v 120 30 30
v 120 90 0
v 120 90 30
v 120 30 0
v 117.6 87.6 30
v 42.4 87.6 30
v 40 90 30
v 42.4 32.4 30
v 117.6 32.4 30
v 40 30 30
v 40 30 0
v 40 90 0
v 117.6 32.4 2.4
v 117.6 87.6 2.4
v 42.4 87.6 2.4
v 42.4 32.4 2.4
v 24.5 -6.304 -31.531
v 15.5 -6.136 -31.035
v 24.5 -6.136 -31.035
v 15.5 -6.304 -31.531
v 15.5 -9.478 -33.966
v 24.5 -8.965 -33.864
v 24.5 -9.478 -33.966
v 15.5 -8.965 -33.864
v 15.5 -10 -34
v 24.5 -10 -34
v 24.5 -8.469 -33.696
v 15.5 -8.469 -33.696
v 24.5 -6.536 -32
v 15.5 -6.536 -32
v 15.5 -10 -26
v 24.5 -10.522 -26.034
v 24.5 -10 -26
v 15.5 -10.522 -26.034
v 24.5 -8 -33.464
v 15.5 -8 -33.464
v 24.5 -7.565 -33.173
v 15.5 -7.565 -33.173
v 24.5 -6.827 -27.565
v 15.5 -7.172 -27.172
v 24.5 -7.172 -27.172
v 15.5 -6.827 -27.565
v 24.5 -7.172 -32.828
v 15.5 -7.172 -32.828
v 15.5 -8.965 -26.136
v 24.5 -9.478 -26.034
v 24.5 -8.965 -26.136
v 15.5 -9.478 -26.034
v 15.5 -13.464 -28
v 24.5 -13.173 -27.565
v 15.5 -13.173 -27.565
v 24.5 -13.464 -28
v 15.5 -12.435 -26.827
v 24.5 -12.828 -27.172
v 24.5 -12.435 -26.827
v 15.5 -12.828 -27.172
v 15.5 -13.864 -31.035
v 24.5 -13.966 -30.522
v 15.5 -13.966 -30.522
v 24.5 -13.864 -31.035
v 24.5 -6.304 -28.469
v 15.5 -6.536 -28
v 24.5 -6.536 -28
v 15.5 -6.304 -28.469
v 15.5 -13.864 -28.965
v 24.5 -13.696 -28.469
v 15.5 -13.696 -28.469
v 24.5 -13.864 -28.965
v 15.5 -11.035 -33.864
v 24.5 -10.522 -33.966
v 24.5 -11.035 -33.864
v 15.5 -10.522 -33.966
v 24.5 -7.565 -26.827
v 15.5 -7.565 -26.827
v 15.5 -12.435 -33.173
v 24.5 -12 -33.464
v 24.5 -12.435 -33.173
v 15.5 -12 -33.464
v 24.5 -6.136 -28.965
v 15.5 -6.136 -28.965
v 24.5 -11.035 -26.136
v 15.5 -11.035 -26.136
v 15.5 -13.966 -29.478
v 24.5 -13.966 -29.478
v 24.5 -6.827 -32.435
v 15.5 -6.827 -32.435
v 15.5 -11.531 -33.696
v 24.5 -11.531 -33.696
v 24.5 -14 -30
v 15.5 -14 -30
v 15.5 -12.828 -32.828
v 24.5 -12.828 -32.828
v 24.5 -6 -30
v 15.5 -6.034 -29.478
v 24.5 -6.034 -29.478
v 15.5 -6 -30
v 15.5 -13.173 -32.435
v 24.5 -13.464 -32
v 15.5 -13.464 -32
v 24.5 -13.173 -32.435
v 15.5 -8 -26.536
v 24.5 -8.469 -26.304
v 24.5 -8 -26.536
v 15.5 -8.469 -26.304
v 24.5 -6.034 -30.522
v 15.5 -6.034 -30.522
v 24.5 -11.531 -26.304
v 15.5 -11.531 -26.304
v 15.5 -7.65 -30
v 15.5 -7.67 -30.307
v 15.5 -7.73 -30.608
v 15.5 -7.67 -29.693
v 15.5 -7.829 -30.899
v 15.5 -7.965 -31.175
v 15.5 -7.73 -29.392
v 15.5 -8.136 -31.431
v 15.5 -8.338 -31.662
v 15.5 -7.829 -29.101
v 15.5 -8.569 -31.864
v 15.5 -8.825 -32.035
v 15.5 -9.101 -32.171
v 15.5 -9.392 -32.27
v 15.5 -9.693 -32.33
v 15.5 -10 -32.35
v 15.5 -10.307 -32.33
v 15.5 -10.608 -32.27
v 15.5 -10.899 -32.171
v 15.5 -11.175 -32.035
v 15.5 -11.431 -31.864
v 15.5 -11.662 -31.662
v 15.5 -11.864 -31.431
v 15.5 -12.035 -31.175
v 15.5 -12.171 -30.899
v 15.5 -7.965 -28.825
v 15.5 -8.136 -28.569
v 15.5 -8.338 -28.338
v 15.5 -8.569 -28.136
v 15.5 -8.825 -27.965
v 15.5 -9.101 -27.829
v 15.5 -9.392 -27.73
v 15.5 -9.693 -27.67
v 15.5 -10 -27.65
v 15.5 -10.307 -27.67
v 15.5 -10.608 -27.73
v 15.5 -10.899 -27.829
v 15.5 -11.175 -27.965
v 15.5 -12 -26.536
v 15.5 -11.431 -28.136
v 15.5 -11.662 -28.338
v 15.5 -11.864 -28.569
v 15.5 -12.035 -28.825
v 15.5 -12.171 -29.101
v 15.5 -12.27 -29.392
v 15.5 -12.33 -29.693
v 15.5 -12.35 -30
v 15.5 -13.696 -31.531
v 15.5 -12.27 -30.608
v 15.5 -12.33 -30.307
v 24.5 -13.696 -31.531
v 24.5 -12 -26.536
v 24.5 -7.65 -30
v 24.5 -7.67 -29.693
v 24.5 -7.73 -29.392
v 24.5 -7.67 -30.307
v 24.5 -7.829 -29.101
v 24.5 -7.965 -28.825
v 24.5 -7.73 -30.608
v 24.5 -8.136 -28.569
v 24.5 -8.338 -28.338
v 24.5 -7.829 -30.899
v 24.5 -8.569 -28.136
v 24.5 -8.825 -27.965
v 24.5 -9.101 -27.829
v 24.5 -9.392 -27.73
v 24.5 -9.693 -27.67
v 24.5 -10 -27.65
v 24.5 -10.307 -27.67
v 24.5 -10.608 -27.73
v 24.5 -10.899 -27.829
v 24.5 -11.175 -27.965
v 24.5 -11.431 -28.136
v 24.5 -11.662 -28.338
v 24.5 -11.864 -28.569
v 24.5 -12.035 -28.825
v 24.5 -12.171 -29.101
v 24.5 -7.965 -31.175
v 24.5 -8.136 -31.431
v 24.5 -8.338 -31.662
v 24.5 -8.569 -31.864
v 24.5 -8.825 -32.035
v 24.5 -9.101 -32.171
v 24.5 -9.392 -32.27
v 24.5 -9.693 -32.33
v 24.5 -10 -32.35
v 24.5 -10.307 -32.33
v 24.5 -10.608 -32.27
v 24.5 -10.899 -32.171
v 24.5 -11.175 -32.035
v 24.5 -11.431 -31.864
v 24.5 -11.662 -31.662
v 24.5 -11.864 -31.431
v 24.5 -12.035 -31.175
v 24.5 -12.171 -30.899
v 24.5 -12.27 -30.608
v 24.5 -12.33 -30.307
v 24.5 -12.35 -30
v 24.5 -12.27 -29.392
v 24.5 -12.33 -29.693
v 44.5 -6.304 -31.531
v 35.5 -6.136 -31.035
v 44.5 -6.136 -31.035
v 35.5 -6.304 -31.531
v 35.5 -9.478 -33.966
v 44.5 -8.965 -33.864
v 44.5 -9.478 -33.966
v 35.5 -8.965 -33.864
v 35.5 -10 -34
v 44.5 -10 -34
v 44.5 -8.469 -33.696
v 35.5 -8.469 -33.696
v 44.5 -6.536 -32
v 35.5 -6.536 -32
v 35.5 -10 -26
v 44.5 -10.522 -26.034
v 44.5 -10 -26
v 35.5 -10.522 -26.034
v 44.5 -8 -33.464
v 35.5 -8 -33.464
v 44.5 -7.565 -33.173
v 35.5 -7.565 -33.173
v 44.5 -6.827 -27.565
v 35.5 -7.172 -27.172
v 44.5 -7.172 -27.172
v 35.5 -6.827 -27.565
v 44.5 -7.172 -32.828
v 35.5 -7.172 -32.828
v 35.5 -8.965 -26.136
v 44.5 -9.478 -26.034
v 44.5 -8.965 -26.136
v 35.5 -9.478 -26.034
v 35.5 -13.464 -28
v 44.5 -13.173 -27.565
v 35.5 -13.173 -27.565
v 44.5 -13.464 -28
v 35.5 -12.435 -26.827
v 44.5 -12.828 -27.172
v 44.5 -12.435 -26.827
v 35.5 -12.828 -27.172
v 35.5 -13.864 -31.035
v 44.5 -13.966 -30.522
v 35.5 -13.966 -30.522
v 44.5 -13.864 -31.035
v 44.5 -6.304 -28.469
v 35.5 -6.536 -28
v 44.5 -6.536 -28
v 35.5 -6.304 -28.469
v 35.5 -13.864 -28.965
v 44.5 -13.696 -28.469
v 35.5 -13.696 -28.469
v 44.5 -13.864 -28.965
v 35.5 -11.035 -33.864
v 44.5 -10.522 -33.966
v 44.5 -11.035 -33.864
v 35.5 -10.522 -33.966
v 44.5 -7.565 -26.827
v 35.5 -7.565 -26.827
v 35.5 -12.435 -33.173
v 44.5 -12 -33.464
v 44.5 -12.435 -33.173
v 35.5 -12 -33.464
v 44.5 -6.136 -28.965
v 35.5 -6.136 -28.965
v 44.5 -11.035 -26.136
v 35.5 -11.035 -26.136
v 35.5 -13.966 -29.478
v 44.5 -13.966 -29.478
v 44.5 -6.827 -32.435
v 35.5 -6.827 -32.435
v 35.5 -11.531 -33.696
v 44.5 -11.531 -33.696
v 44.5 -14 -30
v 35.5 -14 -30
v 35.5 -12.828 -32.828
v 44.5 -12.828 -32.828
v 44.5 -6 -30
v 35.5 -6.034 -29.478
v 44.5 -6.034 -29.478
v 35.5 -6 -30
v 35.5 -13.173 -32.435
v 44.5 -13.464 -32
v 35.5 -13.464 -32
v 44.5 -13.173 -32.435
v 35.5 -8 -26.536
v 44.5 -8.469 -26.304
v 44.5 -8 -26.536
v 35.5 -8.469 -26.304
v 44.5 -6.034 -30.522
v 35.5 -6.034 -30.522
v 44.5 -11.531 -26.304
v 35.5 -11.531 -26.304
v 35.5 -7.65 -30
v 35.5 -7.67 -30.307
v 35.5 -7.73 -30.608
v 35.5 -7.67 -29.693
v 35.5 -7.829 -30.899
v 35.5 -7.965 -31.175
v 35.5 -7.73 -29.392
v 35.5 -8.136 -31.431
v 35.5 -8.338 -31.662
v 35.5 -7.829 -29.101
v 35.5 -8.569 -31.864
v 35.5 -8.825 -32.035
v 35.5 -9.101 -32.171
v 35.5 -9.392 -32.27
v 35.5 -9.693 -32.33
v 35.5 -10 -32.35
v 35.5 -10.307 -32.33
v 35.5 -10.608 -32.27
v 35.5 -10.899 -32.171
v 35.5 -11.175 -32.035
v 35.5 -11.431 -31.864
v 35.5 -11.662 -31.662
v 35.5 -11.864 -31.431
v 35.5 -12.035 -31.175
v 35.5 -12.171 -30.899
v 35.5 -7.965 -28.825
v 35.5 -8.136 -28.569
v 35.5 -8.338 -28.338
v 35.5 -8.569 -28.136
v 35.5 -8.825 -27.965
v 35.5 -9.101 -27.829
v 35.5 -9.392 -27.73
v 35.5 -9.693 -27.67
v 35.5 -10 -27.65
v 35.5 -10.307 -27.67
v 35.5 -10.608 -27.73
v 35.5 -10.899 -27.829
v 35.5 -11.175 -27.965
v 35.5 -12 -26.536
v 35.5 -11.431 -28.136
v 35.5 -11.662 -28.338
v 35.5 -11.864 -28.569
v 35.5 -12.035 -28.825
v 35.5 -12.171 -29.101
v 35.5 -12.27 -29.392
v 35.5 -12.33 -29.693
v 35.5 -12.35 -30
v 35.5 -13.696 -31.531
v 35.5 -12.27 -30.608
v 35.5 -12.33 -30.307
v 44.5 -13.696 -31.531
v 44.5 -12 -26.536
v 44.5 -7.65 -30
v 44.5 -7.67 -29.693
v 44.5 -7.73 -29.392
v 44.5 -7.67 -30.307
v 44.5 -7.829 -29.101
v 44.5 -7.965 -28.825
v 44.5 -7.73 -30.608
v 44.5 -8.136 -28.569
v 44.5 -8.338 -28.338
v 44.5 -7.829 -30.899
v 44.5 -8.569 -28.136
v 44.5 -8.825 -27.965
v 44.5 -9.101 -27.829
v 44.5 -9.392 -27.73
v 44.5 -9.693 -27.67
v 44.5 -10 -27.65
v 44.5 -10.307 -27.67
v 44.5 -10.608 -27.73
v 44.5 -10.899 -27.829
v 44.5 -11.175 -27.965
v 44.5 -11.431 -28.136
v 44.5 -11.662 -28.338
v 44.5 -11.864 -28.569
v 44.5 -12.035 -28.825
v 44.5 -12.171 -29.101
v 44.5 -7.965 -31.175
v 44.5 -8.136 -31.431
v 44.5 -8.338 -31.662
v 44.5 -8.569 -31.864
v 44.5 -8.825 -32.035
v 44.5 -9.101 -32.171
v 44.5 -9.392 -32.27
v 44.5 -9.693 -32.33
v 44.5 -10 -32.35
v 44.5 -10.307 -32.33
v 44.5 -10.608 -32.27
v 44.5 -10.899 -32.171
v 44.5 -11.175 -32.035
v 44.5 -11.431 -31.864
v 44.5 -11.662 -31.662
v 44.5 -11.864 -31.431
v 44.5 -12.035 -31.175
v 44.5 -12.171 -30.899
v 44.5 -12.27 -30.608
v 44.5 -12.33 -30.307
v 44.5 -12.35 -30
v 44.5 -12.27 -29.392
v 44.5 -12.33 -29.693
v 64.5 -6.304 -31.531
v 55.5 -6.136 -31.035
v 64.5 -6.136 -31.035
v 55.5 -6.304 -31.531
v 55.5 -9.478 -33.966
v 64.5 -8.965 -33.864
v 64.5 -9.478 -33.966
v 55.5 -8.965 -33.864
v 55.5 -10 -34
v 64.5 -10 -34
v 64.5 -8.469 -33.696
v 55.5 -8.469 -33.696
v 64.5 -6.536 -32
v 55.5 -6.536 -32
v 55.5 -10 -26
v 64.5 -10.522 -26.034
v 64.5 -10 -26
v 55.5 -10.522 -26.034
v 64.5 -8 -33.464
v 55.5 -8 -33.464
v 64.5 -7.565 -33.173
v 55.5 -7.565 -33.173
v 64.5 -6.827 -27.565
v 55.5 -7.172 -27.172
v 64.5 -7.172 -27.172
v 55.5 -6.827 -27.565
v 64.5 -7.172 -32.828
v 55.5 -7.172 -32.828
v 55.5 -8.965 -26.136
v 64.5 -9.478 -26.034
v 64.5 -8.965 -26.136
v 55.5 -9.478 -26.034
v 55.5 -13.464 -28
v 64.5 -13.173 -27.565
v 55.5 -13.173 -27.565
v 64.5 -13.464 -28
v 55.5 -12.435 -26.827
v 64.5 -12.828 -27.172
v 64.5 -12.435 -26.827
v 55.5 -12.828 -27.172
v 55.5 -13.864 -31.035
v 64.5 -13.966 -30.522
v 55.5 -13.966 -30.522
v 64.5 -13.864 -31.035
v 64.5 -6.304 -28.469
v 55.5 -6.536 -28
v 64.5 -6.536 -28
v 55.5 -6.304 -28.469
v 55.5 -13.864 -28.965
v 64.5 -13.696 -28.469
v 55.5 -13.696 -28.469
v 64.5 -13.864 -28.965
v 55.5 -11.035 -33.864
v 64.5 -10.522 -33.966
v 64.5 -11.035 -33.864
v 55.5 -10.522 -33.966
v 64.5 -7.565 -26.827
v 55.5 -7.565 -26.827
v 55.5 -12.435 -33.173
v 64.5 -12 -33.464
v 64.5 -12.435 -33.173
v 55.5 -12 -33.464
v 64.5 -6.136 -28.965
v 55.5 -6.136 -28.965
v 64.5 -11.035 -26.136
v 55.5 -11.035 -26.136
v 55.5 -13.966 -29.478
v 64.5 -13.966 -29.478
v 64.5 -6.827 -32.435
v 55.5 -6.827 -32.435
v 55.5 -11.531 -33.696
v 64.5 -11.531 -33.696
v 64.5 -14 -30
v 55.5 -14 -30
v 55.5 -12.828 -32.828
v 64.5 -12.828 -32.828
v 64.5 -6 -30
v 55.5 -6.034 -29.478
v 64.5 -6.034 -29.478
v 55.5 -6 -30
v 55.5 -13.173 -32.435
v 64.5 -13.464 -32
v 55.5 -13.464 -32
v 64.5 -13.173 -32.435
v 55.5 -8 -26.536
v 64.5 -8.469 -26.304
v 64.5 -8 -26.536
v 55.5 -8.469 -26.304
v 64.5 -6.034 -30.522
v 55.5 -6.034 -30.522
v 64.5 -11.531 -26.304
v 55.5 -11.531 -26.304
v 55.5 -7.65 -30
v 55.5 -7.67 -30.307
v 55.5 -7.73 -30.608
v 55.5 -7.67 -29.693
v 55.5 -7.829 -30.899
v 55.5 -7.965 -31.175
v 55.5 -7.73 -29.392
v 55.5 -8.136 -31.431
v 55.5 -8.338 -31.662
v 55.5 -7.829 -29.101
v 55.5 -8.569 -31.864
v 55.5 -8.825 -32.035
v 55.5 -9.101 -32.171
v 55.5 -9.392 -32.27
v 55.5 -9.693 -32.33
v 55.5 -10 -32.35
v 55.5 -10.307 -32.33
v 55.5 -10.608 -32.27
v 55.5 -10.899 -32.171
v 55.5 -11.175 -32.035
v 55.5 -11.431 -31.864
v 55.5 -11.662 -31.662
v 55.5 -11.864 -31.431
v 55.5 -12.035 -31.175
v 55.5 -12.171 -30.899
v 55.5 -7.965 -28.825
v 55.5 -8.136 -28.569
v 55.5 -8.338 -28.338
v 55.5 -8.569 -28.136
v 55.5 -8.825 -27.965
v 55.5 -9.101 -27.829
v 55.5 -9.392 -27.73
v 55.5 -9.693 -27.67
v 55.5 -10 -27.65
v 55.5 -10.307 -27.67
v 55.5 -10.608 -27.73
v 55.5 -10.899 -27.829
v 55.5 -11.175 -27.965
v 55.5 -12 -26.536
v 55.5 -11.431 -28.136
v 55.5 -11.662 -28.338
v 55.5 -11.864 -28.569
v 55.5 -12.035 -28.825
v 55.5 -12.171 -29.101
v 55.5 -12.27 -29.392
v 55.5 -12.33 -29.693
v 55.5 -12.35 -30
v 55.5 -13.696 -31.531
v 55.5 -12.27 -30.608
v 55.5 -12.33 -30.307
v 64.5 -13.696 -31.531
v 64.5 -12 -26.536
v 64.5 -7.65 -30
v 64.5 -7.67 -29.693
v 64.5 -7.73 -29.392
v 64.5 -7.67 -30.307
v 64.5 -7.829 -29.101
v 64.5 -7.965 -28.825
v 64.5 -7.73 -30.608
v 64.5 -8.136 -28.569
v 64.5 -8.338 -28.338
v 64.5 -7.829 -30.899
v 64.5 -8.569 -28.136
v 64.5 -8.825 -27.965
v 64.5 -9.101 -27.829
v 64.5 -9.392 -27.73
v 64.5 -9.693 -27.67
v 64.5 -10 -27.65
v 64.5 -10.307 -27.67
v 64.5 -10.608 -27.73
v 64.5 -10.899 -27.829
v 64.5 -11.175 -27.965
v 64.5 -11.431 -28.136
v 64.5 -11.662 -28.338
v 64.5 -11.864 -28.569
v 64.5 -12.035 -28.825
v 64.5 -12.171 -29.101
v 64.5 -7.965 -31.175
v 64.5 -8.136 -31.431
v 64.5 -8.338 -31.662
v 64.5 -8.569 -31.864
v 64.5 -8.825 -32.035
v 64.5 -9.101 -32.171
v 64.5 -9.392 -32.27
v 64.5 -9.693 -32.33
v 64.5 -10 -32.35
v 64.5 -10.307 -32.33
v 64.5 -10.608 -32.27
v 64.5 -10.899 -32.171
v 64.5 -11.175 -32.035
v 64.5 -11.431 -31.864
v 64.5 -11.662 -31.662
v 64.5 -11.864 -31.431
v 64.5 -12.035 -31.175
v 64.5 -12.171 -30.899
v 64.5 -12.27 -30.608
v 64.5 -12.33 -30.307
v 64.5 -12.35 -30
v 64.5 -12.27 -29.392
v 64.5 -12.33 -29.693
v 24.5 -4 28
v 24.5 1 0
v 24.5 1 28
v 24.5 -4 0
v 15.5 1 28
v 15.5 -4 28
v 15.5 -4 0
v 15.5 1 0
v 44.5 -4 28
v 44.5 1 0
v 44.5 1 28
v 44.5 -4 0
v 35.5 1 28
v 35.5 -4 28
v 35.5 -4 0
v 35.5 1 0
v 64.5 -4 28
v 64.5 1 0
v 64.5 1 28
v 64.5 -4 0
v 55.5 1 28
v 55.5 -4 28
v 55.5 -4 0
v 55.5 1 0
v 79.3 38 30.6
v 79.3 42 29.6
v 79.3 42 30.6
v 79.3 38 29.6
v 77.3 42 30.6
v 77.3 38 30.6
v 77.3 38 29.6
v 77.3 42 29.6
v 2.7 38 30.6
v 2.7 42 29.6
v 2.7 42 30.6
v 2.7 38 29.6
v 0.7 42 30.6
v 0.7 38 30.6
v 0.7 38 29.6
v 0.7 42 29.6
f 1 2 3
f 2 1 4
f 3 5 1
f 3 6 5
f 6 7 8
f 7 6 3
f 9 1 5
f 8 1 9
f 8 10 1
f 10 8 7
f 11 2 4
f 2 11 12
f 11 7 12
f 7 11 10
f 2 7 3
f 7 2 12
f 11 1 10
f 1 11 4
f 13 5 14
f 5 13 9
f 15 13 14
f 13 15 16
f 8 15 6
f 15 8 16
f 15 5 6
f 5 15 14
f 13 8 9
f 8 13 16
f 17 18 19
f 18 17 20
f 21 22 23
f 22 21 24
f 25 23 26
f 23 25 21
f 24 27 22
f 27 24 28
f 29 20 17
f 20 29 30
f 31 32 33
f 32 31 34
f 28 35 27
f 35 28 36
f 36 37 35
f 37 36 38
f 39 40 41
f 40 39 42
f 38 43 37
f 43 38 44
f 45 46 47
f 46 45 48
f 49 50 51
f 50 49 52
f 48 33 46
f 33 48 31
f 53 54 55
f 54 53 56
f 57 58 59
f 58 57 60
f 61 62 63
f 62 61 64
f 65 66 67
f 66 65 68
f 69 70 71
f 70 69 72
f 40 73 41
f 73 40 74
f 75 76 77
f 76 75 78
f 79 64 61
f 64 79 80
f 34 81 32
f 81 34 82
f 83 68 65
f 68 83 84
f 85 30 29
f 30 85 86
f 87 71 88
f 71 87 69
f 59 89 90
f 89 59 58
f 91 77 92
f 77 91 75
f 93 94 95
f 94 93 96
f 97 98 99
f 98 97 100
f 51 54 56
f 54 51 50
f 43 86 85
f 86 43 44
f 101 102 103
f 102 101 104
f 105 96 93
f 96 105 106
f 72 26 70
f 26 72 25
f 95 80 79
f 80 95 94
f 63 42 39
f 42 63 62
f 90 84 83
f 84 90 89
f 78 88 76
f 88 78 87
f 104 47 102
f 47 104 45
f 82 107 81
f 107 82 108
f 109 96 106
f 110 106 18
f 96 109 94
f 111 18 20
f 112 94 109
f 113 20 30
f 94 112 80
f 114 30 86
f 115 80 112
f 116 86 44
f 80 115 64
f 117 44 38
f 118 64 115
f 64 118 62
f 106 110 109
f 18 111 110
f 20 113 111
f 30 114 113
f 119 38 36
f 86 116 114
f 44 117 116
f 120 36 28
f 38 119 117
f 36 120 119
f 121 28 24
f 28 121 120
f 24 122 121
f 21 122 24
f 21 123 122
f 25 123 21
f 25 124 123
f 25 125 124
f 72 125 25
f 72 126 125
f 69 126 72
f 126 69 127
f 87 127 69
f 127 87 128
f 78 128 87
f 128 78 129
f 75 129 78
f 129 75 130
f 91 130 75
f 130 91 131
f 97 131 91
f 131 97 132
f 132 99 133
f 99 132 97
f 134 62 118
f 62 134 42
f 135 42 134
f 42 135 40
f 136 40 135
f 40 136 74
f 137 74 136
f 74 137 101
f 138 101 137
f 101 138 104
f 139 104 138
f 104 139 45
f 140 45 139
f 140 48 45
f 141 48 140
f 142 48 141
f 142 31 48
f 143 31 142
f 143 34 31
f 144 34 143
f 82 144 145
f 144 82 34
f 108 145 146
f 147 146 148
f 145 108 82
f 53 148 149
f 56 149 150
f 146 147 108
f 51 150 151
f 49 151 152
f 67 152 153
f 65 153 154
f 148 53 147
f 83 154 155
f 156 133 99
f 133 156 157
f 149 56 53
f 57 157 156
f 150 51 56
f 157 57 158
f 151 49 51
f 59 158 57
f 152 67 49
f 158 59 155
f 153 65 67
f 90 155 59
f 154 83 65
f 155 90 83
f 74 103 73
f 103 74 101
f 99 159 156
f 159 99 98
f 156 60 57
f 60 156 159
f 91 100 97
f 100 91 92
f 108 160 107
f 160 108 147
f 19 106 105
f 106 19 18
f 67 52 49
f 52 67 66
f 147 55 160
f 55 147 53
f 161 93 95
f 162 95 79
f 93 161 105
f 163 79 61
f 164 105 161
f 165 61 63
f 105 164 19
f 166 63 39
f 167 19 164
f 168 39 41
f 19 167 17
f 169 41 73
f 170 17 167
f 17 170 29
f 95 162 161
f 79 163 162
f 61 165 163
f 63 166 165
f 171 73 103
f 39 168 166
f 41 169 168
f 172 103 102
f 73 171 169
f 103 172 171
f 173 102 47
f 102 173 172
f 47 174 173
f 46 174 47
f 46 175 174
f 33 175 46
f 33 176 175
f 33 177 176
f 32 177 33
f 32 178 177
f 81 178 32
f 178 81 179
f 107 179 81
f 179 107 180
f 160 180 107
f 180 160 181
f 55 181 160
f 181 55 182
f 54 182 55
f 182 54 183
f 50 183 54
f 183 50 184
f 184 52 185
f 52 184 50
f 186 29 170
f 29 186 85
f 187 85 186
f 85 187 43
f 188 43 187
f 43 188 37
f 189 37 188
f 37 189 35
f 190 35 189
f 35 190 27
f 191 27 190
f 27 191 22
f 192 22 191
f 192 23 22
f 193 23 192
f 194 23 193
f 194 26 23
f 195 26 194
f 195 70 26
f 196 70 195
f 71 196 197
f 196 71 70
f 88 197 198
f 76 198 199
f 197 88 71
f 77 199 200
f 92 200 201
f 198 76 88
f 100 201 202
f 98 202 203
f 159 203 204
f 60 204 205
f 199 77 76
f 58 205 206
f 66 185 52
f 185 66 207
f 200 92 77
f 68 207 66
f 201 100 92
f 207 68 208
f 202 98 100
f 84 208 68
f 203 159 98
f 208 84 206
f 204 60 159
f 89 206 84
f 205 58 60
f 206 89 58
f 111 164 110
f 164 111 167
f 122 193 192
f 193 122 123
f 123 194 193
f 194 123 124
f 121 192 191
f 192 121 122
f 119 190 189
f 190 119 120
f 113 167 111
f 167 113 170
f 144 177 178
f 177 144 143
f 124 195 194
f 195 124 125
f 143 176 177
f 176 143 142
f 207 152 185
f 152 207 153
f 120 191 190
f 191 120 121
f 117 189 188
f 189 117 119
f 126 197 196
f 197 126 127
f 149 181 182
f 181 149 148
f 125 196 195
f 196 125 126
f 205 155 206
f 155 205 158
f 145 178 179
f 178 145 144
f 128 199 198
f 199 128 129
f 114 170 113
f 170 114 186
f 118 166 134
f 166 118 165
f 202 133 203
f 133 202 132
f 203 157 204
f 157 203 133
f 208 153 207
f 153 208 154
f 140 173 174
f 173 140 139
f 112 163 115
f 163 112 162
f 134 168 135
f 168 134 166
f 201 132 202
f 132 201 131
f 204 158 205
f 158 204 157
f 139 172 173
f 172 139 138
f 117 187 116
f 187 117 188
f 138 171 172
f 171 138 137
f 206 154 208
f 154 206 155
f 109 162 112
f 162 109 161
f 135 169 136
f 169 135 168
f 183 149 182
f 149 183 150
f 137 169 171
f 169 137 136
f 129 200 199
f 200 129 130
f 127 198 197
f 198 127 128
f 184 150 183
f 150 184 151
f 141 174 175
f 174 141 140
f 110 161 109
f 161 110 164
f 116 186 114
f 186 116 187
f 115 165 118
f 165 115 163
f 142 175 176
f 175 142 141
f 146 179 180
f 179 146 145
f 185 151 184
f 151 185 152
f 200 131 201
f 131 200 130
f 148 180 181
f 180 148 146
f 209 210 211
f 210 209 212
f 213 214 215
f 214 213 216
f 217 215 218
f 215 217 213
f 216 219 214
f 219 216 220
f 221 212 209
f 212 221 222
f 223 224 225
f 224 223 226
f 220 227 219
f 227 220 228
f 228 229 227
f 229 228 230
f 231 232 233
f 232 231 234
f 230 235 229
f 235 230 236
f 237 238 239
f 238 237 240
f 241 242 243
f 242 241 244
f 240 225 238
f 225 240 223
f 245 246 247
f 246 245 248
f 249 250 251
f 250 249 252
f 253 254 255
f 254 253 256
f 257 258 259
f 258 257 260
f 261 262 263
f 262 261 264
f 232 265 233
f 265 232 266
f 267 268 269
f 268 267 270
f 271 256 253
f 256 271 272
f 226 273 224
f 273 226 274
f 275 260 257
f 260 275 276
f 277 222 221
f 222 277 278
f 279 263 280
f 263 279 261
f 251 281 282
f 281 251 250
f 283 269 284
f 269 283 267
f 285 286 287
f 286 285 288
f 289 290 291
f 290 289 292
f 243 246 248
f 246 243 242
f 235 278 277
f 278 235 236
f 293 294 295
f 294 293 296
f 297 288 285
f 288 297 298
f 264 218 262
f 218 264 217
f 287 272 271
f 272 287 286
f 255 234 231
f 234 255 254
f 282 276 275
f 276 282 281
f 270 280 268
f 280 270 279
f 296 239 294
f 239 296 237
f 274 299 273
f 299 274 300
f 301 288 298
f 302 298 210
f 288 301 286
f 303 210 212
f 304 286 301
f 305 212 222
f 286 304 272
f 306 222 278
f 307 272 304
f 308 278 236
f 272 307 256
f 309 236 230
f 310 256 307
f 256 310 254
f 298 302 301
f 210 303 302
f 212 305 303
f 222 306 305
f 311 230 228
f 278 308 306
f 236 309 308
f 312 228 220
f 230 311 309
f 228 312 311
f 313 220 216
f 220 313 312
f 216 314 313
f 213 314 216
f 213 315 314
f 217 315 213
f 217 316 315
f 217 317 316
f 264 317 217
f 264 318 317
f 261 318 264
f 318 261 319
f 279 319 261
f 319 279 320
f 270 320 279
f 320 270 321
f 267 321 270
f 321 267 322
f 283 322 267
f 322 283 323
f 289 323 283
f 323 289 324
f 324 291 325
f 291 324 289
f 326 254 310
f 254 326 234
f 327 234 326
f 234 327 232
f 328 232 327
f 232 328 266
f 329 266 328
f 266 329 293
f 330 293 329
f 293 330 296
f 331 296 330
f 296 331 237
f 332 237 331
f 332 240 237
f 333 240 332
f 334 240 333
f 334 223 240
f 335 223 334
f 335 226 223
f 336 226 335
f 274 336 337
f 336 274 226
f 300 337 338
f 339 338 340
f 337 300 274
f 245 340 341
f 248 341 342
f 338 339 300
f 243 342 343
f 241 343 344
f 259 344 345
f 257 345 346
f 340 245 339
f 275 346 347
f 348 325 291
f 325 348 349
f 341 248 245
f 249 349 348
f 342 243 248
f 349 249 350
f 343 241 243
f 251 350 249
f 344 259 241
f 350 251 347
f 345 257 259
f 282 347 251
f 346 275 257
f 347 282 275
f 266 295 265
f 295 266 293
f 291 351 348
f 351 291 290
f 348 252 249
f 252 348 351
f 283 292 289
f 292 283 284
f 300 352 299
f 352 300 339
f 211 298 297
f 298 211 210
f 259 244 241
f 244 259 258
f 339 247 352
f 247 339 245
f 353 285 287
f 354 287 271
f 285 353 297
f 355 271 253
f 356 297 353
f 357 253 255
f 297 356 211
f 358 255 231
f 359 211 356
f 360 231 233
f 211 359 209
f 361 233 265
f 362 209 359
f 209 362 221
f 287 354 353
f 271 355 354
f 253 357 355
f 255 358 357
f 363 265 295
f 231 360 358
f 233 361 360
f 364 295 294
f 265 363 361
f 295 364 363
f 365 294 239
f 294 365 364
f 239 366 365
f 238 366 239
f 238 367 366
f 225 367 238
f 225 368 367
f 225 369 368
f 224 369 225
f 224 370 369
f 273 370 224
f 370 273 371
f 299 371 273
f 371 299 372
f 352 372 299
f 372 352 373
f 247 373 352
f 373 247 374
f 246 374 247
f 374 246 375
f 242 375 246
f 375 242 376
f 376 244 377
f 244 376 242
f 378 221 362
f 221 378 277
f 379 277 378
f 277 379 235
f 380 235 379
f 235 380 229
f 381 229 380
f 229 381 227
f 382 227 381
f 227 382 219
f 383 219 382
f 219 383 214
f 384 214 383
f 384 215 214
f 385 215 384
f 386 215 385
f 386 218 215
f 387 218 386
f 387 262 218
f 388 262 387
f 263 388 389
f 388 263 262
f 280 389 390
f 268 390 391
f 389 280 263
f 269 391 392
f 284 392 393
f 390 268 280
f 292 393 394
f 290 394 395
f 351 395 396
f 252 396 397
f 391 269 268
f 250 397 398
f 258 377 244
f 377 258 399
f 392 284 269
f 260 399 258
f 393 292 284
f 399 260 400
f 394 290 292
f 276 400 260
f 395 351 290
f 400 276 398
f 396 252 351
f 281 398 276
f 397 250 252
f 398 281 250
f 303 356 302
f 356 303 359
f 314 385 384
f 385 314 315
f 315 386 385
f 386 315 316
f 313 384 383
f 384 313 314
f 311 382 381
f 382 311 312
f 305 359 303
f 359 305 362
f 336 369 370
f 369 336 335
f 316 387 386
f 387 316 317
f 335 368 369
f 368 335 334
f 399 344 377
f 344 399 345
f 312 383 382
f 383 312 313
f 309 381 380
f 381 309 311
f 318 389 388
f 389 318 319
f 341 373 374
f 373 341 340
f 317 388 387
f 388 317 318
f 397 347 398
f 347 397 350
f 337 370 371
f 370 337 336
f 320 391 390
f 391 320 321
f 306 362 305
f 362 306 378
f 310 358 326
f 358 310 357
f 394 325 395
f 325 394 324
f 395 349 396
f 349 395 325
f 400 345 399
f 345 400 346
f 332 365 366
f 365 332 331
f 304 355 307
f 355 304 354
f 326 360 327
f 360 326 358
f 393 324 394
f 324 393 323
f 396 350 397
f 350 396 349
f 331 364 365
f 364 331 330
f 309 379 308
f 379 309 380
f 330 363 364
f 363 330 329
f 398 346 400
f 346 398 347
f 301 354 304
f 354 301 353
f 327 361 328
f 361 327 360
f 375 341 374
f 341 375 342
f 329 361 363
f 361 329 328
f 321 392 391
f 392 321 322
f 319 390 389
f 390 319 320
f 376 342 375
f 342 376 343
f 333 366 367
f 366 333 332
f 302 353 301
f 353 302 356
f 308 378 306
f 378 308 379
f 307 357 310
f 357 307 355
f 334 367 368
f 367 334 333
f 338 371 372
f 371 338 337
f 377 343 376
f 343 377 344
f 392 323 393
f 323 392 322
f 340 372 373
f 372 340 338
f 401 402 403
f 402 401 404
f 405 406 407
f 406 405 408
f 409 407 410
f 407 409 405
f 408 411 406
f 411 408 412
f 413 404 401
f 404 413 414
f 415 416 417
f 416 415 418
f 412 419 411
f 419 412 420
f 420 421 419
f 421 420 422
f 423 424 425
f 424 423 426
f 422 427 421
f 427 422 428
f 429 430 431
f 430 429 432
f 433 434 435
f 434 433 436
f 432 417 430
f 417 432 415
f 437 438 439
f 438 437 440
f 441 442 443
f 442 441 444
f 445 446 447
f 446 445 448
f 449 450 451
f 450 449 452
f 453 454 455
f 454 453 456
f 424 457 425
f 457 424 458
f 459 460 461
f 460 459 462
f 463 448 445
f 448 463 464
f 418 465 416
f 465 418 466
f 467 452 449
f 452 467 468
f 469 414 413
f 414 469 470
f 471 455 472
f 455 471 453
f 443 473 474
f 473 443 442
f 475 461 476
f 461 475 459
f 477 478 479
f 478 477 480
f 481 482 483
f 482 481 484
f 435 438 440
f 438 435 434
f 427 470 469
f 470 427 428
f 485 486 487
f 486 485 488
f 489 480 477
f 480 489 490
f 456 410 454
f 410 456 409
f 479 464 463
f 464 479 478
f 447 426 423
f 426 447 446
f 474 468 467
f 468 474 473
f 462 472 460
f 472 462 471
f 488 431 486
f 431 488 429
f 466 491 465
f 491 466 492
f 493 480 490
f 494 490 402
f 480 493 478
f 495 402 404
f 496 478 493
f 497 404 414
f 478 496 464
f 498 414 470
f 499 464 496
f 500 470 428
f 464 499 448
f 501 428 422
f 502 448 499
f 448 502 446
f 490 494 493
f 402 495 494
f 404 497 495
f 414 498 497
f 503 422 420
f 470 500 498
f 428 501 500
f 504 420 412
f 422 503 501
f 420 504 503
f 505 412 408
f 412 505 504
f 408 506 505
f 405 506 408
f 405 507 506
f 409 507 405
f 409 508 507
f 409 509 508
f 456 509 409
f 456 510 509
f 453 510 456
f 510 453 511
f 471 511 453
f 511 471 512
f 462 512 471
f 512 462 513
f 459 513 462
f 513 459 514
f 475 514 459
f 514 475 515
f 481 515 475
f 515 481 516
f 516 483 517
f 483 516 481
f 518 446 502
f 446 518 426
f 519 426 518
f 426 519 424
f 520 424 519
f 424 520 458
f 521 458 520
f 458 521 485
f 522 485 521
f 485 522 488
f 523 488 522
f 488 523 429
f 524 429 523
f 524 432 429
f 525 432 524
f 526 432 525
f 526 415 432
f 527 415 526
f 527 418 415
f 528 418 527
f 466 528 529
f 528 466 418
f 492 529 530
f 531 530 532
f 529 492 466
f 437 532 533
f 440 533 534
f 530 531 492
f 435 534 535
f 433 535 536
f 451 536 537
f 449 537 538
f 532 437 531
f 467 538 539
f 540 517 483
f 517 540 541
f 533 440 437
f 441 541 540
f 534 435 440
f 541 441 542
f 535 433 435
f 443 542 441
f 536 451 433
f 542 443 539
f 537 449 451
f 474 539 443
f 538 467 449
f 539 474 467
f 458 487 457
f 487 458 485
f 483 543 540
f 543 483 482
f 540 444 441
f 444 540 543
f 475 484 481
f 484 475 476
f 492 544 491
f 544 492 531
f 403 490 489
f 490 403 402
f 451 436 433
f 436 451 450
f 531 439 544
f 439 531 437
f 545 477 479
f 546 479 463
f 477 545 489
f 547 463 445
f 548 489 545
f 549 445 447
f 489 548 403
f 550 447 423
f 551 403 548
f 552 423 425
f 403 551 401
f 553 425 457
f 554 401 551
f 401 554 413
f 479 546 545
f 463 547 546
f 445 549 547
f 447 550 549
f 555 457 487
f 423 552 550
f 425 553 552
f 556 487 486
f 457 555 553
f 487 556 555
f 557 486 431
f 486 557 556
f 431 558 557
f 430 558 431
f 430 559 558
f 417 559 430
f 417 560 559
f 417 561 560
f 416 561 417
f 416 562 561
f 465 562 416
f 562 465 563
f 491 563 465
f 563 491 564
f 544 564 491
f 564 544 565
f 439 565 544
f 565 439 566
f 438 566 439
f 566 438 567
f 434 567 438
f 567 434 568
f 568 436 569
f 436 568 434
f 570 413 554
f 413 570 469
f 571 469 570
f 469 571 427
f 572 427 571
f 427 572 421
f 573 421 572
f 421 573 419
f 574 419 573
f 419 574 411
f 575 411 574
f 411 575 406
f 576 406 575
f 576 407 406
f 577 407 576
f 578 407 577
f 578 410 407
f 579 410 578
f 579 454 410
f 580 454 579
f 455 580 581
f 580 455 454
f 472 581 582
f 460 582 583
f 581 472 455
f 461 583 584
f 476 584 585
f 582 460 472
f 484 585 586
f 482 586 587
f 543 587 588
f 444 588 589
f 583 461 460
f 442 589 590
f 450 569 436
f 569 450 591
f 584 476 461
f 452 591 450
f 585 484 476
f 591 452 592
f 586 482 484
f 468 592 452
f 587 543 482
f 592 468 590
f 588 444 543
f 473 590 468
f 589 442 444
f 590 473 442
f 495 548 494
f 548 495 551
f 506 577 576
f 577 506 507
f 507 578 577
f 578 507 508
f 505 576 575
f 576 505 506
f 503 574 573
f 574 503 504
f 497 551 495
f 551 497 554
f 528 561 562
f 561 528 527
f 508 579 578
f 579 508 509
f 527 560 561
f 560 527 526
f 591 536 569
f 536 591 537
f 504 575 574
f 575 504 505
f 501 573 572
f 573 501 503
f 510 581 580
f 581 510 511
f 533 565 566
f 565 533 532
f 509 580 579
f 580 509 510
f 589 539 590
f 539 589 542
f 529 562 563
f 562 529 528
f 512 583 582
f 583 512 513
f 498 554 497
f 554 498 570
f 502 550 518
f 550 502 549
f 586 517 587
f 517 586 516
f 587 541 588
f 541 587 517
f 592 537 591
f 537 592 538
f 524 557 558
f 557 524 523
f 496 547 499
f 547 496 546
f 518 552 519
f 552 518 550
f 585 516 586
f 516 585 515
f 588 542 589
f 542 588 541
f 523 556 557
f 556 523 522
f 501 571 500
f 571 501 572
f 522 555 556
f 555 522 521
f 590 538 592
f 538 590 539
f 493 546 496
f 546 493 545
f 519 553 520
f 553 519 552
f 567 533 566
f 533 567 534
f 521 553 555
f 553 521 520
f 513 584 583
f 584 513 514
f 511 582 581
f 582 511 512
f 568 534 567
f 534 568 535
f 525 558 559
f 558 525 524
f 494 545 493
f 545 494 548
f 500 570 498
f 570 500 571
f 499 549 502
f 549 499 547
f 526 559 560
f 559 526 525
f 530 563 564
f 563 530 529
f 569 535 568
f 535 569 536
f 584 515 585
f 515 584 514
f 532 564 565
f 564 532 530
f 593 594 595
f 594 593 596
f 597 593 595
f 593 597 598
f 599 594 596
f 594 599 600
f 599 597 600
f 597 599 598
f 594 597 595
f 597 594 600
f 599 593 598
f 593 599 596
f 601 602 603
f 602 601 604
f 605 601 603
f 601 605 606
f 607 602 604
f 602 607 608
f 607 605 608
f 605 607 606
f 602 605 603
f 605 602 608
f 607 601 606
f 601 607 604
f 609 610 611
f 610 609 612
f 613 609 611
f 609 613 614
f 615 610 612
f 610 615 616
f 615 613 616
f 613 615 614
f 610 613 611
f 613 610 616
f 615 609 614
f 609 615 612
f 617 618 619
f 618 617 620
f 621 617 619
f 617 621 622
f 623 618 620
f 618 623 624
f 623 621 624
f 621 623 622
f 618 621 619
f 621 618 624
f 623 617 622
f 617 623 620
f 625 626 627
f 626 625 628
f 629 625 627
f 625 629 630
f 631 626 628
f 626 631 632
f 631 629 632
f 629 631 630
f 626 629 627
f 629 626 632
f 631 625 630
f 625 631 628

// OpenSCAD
// Box 80x60x40 closed, lid 10 tall; hinge axis y=-30,z=30, 5 knuckles KL9/BR2.35
// Prints as 4 separate support-free parts (box,lid,pin,2x cap); pin+ caps assembled by hand.
// Assembly shown closed; lid_swing 0..110 deg about +X at (0,-30,30).
part = "box";
$fn = 48;
W=80; D=60; Hb=30; WT=2.4; FT=2.4;
KR=4; BR=2.35; KL=9;
BOXC=[-20,0,20]; LIDC=[-10,10];
PIN_R=2; PIN_L=55; CAP_R=3; CAP_HOLE=1.85; CAP_T=2;
cadverify_only = "";
module instance(name, part, unit = 1) {
  echo(cadverify_instance = [name, part, unit]);
  if (cadverify_only == "" || cadverify_only == name) children();
}
module knuckleX(cx,ay,az) {
  translate([cx-KL/2,ay,az]) rotate([0,90,0])
    difference() { cylinder(r=KR,h=KL); translate([0,0,-0.2]) cylinder(r=BR,h=KL+0.4); }
}
module box_part() {
  union() {
    difference() { cube([80,60,30]); translate([2.4,2.4,2.4]) cube([75.2,55.2,30]); }
    for (cx=BOXC) {
      translate([cx,-40,-30]) knuckleX(0,0,0);
      translate([cx-4.5,-34,0]) cube([9,5,28]);
    }
    translate([37.3,8,29.6]) cube([2,4,1]);
    translate([-39.3,8,29.6]) cube([2,4,1]);
  }
}
module lid_part() {
  union() {
    difference() {
      union() {
        translate([-40,-30,0]) cube([80,60,2.4]);
        translate([-37.2,-27.2,2.0]) cube([74.4,2,7.6]);
        translate([-37.2,25.2,2.0]) cube([74.4,2,7.6]);
        translate([-37.2,-25.2,2.0]) cube([2,50.4,7.6]);
        translate([35.2,-25.2,2.0]) cube([2,50.4,7.6]);
        for (cx=LIDC) {
          translate([cx,-30,10]) knuckleX(0,0,0);
          translate([cx-4.5,-34,0]) cube([9,8,12]);
        }
      }
      translate([36.8,7.8,8.4]) cube([0.5,4.4,1.3]);
      translate([-37.3,7.8,8.4]) cube([0.5,4.4,1.3]);
    }
  }
}
module pin_part() cylinder(r=2,h=55);
module cap_part() difference() { cylinder(r=3,h=2); translate([0,0,-0.2]) cylinder(r=1.85,h=2.4); }
if (part=="box") {
  echo(cadverify_spec=[
    ["bounds",[[-40,-34,0],[40,30,34]]],["bodies",1],["through_holes",3],
    ["support_faces",[["base","-z",4000]]],
    ["overhangs_allowed",[["knuckle curved undersides and bore roofs, bridges to 4.7",[[-31,-35,25],[31,-25,35]]]]],
    ["copies",1],
    ["details",[
      ["wall","thickness",[0,32,15],[0,-1,0],2.4],
      ["floor","thickness",[0,0,-1],[0,0,1],2.4],
      ["knuckle","material",[[-4.5,-34,26],[4.5,-26,34]],0.3],
      ["bore","hole",[8,-30,30],[-1,0,0],[[0,4.7],[9,4.7]]],
      ["nub","material",[[37.3,8,29.6],[39.3,12,30.6]],0.9]]]]);
  translate([40,30,0]) box_part();
}
if (part=="lid") {
  echo(cadverify_spec=[
    ["bounds",[[-40,-34,0],[40,30,14]]],["bodies",1],["through_holes",2],
    ["support_faces",[["plate","-z",4000]]],
    ["overhangs_allowed",[["knuckle curved undersides and bore roofs, bridges to 4.7",[[-16,-35,5],[16,-25,15]]]]],
    ["copies",1],
    ["details",[
      ["plate","thickness",[0,0,-1],[0,0,1],2.4],
      ["knuckle","material",[[5.5,-34,6],[14.5,-26,14]],0.3],
      ["bore","hole",[18,-30,10],[-1,0,0],[[0,4.7],[9,4.7]]],
      ["notch","void",[[36.8,7.8,8.4],[37.3,12.2,9.7]],0.8]]]]);
  lid_part();
}
if (part=="pin") {
  echo(cadverify_spec=[
    ["bounds",[[-2,-2,0],[2,2,55]]],["bodies",1],["through_holes",0],
    ["support_faces",[["base","-z",8]]],["copies",1],
    ["details",[["shaft","thickness",[3,0,30],[-1,0,0],4]]]]);
  pin_part();
}
if (part=="cap") {
  echo(cadverify_spec=[
    ["bounds",[[-3,-3,0],[3,3,2]]],["bodies",1],["through_holes",1],
    ["support_faces",[["base","-z",12]]],["copies",2],
    ["details",[["ring","thickness",[2.4,0,3],[0,0,-1],2]]]]);
  cap_part();
}
if (part=="assembly") {
  echo(cadverify_spec=[
    ["bounds",[[-40,-34,0],[40,30,40]]],
    ["support_faces",[["bed","-z",4000]]],
    ["allowed_interferences",[["cap_plus","pin","cap bore press fit 0.15"],["cap_minus","pin","cap bore press fit 0.15"]]],
    ["motions",[["lid_swing",["lid"],"rotate",[0,-30,30],[1,0,0],[0,110]]]],
    ["assembly_order",[[["box"]],[["lid"],[0,0,1]],[["pin"],[-1,0,0]],[["cap_plus"],[-1,0,0]],[["cap_minus"],[1,0,0]]]]]);
  instance("box","box") translate([-40,-30,0]) box_part();
  instance("lid","lid") translate([0,0,40]) rotate([0,180,0]) lid_part();
  instance("pin","pin") translate([-27.5,-30,30]) rotate([0,90,0]) pin_part();
  instance("cap_plus","cap") translate([27.5,-30,30]) rotate([0,90,0]) cap_part();
  instance("cap_minus","cap") translate([-27.5,-30,30]) rotate([0,-90,0]) cap_part();
}
